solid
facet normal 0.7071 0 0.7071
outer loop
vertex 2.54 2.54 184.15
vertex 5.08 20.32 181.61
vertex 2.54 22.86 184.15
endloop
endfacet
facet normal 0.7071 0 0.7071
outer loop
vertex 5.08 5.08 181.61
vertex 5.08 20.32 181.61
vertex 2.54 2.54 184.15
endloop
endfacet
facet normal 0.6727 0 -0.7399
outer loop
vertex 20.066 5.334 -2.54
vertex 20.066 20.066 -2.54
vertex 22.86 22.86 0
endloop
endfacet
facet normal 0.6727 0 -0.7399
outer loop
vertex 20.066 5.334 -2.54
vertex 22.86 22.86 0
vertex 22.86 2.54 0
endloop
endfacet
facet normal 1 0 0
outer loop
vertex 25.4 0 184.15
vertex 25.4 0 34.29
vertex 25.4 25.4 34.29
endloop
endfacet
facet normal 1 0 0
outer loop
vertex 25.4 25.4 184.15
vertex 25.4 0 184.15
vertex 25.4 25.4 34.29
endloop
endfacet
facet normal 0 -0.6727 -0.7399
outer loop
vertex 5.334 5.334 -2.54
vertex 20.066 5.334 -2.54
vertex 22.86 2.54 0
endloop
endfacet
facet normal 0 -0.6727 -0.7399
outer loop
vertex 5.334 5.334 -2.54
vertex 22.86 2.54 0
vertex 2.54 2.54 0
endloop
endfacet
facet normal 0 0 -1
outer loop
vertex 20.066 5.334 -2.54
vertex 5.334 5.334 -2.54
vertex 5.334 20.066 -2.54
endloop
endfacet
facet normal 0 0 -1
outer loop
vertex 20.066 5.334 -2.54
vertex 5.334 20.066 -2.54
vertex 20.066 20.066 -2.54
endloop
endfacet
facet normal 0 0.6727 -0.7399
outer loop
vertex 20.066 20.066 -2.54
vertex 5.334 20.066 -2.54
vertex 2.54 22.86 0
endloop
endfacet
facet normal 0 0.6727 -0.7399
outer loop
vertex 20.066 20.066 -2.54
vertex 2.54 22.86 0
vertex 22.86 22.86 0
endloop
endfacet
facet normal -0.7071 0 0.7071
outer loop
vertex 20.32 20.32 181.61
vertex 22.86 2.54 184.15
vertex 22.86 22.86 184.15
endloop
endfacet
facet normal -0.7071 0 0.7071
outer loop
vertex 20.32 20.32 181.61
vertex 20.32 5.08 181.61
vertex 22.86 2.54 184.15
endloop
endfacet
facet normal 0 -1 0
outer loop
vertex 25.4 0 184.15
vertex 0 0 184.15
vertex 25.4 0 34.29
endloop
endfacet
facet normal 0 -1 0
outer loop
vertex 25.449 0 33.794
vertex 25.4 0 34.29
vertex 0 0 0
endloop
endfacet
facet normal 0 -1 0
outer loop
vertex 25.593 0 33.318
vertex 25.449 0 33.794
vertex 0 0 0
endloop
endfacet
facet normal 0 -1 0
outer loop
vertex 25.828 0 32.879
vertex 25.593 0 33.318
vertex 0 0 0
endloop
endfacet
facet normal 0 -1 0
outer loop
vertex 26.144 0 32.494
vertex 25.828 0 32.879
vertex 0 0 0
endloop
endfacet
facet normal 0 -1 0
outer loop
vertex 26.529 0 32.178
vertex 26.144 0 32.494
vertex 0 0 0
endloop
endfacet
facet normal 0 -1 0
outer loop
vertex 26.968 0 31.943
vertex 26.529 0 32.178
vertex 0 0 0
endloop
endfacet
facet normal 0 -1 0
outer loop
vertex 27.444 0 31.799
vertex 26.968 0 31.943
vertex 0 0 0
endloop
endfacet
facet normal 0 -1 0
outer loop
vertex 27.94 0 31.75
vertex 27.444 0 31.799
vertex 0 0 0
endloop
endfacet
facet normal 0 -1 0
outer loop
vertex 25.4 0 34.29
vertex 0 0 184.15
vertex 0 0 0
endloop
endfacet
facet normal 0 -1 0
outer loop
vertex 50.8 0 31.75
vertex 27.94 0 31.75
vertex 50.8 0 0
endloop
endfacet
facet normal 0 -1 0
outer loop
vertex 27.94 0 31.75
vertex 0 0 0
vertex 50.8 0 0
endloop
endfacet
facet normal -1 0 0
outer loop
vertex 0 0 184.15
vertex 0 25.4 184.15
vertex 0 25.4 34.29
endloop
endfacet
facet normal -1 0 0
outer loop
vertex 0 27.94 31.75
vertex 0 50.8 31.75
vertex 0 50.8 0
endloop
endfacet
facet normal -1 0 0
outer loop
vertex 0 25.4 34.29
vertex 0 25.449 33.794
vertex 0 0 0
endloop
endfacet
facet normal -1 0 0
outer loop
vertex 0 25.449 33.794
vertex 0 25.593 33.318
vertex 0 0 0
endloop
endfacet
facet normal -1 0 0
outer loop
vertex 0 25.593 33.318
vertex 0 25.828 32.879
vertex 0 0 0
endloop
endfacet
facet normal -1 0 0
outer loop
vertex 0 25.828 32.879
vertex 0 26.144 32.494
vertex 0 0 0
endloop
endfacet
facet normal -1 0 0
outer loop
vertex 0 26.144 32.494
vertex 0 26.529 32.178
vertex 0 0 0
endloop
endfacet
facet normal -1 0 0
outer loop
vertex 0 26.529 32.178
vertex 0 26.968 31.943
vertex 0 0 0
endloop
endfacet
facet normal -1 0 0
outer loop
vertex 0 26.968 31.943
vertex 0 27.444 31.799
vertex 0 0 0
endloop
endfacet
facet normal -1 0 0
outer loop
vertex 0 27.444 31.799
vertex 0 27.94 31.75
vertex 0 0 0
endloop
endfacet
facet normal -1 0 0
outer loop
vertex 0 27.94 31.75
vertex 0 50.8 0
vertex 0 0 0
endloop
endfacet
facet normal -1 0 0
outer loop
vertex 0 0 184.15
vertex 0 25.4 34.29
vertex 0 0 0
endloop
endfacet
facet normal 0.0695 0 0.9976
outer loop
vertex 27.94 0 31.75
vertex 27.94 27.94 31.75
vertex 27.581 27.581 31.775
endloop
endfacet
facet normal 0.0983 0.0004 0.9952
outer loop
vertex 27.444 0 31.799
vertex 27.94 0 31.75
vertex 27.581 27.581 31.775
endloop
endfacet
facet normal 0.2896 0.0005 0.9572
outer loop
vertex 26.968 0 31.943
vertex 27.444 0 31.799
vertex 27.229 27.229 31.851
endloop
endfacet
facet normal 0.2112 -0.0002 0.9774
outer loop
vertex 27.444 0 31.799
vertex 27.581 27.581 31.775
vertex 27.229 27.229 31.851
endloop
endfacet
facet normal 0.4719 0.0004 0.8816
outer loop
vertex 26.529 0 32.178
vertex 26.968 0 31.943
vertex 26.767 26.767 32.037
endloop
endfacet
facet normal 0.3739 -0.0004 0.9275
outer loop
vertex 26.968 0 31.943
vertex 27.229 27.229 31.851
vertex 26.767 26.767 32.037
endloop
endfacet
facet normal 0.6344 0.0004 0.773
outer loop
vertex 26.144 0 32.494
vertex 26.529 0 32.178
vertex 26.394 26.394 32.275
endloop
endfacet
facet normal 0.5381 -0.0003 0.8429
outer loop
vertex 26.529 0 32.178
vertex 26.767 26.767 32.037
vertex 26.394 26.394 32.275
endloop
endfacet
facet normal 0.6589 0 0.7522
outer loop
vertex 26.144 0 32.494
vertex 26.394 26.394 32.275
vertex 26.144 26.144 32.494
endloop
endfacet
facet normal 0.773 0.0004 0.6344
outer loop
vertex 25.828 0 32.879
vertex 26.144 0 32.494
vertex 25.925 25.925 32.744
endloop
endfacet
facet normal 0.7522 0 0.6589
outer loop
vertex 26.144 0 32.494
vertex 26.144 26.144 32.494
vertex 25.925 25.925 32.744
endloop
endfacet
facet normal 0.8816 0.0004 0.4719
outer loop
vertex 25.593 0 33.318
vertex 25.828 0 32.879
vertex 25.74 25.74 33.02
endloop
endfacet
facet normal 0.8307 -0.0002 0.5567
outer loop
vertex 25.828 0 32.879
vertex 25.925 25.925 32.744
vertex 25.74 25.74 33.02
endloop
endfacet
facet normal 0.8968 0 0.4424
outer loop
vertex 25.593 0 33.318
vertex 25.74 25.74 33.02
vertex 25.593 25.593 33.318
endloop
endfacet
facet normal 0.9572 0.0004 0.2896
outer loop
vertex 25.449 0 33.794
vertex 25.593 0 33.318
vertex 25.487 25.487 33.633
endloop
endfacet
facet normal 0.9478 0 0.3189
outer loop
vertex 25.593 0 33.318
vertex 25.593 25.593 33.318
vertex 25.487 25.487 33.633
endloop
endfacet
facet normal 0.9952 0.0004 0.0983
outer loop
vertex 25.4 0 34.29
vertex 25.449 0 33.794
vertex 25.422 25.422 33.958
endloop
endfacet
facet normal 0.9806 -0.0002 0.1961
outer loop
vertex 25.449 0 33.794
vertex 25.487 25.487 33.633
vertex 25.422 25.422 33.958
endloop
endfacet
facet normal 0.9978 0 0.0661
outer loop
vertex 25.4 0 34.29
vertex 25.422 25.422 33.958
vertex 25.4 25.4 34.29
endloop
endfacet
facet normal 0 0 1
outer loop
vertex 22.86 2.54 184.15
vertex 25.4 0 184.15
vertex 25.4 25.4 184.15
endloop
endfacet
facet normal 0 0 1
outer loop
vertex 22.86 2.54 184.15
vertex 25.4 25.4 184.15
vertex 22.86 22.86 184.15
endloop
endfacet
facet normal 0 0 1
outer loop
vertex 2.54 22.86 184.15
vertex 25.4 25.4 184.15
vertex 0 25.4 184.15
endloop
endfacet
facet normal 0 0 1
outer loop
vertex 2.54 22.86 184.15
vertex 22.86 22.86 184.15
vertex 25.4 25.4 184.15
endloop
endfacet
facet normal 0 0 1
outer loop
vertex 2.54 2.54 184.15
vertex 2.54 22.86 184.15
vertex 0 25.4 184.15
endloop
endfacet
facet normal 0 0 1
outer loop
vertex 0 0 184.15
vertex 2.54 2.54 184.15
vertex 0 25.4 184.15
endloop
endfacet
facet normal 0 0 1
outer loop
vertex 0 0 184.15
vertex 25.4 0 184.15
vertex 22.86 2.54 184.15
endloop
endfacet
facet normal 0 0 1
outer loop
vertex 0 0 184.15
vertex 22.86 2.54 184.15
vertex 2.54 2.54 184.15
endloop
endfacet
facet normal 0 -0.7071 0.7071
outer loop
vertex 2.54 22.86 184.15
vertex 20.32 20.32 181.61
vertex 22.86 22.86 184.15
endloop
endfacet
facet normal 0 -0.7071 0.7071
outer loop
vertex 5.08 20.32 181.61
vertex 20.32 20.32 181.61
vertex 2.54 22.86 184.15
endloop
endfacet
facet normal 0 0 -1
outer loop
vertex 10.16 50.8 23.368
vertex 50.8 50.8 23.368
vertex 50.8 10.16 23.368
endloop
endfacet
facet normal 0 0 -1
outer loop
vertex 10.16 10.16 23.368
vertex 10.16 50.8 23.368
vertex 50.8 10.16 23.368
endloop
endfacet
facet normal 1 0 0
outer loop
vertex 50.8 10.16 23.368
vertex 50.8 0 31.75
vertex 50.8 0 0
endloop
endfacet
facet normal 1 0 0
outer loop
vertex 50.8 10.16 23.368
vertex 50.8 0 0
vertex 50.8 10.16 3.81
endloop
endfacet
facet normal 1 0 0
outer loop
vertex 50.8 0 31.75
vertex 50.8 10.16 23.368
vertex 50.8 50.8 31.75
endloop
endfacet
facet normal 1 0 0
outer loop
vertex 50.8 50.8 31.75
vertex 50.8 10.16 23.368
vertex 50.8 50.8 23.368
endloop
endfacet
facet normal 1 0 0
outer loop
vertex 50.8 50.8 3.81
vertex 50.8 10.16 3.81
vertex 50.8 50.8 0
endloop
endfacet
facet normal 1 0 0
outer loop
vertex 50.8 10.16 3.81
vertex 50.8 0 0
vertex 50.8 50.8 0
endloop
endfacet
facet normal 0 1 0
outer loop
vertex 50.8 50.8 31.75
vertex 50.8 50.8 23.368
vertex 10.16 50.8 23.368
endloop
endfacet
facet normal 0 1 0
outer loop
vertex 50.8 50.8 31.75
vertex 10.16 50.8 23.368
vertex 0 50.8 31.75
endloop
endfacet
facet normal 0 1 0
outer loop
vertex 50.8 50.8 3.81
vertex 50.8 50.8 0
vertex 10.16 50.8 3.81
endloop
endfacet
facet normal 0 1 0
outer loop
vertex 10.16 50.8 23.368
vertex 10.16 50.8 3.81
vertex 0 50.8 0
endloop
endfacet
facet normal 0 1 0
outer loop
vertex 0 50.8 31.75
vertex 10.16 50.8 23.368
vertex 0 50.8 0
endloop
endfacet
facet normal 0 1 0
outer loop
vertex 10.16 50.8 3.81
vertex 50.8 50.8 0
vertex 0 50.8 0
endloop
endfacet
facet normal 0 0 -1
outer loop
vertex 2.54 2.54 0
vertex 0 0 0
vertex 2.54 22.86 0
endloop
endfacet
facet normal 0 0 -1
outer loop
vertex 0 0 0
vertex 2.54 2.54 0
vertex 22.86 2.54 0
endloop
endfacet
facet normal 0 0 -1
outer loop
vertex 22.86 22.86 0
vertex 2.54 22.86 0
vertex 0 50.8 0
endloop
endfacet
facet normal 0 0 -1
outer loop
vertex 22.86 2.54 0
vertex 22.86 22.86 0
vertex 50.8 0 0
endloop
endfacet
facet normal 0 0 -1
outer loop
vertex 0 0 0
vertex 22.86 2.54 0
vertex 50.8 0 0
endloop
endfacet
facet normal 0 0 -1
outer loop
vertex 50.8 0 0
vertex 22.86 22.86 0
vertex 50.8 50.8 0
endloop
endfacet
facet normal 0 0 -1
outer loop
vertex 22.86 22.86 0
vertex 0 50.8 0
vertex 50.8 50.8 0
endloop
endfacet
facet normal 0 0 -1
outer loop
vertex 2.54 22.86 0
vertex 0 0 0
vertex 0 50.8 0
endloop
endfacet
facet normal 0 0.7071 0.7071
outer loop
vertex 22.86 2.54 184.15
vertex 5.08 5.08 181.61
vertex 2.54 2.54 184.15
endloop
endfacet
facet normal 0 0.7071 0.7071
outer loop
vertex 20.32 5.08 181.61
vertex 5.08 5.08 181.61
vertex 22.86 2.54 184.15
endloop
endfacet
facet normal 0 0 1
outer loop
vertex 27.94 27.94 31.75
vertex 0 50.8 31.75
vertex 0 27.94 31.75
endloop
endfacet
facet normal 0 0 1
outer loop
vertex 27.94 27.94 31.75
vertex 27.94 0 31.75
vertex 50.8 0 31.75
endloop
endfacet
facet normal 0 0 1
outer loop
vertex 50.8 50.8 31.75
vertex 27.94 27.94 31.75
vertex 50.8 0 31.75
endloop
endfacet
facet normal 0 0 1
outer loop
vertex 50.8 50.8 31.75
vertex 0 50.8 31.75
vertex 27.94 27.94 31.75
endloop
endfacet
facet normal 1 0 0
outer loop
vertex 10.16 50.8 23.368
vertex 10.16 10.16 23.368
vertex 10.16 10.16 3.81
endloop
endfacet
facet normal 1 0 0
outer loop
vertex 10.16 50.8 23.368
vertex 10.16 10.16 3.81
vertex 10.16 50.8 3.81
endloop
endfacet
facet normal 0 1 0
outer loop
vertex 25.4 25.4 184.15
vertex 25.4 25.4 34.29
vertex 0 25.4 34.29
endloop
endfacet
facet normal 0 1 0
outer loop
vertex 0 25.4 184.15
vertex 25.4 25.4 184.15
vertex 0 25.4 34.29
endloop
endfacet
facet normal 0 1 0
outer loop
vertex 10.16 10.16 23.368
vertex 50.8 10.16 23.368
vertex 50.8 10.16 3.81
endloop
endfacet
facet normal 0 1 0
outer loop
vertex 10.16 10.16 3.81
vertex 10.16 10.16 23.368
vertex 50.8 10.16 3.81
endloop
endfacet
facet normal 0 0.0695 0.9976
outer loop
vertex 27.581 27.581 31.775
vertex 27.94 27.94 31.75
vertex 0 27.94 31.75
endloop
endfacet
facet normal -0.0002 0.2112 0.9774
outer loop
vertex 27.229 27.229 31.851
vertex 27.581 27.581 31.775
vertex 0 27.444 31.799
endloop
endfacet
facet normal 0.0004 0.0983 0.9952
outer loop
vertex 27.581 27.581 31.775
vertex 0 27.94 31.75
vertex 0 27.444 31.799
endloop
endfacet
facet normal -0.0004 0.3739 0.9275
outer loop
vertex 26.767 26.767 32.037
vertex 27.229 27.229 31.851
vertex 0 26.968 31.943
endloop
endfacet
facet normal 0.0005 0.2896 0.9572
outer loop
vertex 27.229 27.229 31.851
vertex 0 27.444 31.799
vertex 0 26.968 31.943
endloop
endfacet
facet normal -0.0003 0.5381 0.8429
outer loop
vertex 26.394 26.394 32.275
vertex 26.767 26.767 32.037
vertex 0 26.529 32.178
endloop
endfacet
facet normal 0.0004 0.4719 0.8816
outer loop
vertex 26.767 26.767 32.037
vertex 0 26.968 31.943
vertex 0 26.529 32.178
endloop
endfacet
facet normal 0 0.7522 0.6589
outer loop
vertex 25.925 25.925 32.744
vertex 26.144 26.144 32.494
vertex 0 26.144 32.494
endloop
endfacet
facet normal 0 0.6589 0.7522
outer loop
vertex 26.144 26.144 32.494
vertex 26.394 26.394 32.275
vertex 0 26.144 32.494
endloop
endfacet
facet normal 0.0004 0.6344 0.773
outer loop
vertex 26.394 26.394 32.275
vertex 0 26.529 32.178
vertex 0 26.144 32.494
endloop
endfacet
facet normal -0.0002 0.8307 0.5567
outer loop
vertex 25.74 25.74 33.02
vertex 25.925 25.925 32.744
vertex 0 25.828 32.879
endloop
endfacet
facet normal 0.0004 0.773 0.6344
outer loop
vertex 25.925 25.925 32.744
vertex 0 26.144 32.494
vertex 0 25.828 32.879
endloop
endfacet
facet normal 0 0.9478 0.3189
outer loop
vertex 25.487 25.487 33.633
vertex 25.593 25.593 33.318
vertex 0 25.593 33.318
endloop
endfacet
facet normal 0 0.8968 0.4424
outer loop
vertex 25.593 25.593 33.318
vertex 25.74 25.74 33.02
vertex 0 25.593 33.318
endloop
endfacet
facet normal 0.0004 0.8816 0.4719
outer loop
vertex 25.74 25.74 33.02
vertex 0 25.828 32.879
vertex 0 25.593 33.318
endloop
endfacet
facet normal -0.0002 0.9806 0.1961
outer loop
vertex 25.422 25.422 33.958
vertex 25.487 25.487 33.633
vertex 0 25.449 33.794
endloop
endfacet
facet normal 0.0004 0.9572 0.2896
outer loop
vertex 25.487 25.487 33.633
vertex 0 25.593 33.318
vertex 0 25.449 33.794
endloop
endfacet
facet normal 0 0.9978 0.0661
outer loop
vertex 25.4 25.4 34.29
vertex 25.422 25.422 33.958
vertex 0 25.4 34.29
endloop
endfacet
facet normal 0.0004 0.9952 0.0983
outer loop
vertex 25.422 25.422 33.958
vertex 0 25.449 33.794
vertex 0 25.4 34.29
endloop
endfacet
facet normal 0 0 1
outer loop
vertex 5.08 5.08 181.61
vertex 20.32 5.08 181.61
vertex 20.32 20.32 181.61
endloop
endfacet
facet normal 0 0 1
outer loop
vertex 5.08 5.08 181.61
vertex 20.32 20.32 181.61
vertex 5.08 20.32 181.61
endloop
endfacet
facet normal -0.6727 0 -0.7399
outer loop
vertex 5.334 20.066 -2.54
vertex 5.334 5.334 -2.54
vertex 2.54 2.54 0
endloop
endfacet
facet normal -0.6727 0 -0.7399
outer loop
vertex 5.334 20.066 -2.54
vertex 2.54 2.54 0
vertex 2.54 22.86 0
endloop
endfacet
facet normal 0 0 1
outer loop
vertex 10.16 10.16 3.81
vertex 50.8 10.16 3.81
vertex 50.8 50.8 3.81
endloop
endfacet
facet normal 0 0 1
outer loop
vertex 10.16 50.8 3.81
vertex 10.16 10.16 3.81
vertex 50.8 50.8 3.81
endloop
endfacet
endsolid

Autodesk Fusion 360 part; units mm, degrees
sketch "Sketch1" plane through (0, 0, 0) normal (0, 0, 1) x (1, 0, 0)
  line L0 (0, 0) -> (50.8, 0)
  line L1 (50.8, 0) -> (50.8, 50.8)
  line L2 (50.8, 50.8) -> (0, 50.8)
  line L3 (0, 50.8) -> (0, 0)
  dimension "d1" = 50.8
  dimension "d2" = 50.8
extrude "Extrude1" add sketch "Sketch1" along normal blind 31.75
sketch "Sketch2" plane through (50.8, 0, 0) normal (1, 0, 0) x (0, 1, 0)
  line L0 (0, 0) -> (50.8, 0)
  line L1 (50.8, 0) -> (50.8, 31.75)
  line L2 (50.8, 31.75) -> (0, 31.75)
  line L3 (0, 31.75) -> (0, 0)
  line L4 (50.8, 23.368) -> (10.16, 23.368)
  line L5 (10.16, 23.368) -> (10.16, 3.81)
  line L6 (10.16, 3.81) -> (50.8, 3.81)
  line L7 (50.8, 3.81) -> (50.8, 23.368)
  dimension "d5" = 40.64
  dimension "d6" = 19.558
  dimension "d14" = 3.81
extrude "Extrude2" cut sketch "Sketch2" against normal blind 40.64 contours L1 L4 L5 L6 L7
sketch "Sketch3" plane through (0, 0, 31.75) normal (0, 0, 1) x (-1, 0, 0)
  line L0 (0, -50.8) -> (0, 0)
  line L1 (0, 0) -> (-50.8, 0)
  line L2 (-50.8, 0) -> (-50.8, -50.8)
  line L3 (-50.8, -50.8) -> (0, -50.8)
  line L4 (0, 0) -> (-25.4, 0)
  line L5 (-25.4, 0) -> (-25.4, -25.4)
  line L6 (-25.4, -25.4) -> (0, -25.4)
  line L7 (0, -25.4) -> (0, 0)
  dimension "d10" = 25.4
  dimension "d11" = 25.4
extrude "Extrude3" add sketch "Sketch3" along normal blind 152.4 contours L0 L1 L4 L5 L6 L7
fillet "Fillet1" radius 2.54 2 edges at (25.4, 12.7, 31.75) (12.7, 25.4, 31.75)
sketch "Sketch4" plane through (0, 0, 0) normal (0, 0, -1) x (1, 0, 0)
  line L0 (0, 0) -> (0, -50.8)
  line L1 (0, -50.8) -> (50.8, -50.8)
  line L2 (50.8, -50.8) -> (50.8, 0)
  line L3 (50.8, 0) -> (0, 0)
  line L4 (2.54, -2.54) -> (22.86, -2.54)
  line L5 (22.86, -2.54) -> (22.86, -22.86)
  line L6 (22.86, -22.86) -> (2.54, -22.86)
  line L7 (2.54, -22.86) -> (2.54, -2.54)
  dimension "d17" = 2.54
  dimension "d18" = 2.54
  dimension "d19" = 20.32
  dimension "d20" = 20.32
sketch "Sketch5" plane through (0, 0, 0) normal (0, 0, -1) x (1, 0, 0)
  line L0 (5.334, -5.334) -> (20.066, -5.334)
  line L1 (20.066, -5.334) -> (20.066, -20.066)
  line L2 (20.066, -20.066) -> (5.334, -20.066)
  line L3 (5.334, -20.066) -> (5.334, -5.334)
  line L4 (0, -50.8) -> (0, 0)
  line L5 (0, 0) -> (50.8, 0)
  dimension "d37" = 14.732
  dimension "d38" = 14.732
  dimension "d39" = 5.334
  dimension "d40" = 5.334
sketch "Sketch6" plane through (0, 0, 184.15) normal (0, 0, 1) x (-1, 0, 0)
  line L0 (0, -25.4) -> (0, 0)
  line L1 (0, 0) -> (-25.4, 0)
  line L2 (-25.4, 0) -> (-25.4, -25.4)
  line L3 (-25.4, -25.4) -> (0, -25.4)
  line L4 (-2.54, -22.86) -> (-22.86, -22.86)
  line L5 (-22.86, -22.86) -> (-22.86, -2.54)
  line L6 (-22.86, -2.54) -> (-2.54, -2.54)
  line L7 (-2.54, -2.54) -> (-2.54, -22.86)
  line L8 (-5.08, -20.32) -> (-20.32, -20.32)
  line L9 (-20.32, -20.32) -> (-20.32, -5.08)
  line L10 (-20.32, -5.08) -> (-5.08, -5.08)
  line L11 (-5.08, -5.08) -> (-5.08, -20.32)
  dimension "d27" = 2.54
  dimension "d28" = 2.54
  dimension "d29" = 2.54
  dimension "d30" = 20.32
  dimension "d31" = 2.54
  dimension "d32" = 15.24
  dimension "d33" = 15.24
  dimension "d34" = 2.54
extrude "Extrude5" cut sketch "Sketch6" against normal blind 2.54 contours L8 L9 L10 L11
loft "Loft2" cut profiles "Sketch6" section 1 contours L4 L5 L6 L7 section 2 face at (15.24, 15.24, 181.61)
extrude "Extrude7" add sketch "Sketch5" along normal blind 2.54
loft "Loft3" add profiles "Sketch4" section 1 contours L4 L5 L6 L7 section 2 face at (15.1553, 10.2447, -2.54)
